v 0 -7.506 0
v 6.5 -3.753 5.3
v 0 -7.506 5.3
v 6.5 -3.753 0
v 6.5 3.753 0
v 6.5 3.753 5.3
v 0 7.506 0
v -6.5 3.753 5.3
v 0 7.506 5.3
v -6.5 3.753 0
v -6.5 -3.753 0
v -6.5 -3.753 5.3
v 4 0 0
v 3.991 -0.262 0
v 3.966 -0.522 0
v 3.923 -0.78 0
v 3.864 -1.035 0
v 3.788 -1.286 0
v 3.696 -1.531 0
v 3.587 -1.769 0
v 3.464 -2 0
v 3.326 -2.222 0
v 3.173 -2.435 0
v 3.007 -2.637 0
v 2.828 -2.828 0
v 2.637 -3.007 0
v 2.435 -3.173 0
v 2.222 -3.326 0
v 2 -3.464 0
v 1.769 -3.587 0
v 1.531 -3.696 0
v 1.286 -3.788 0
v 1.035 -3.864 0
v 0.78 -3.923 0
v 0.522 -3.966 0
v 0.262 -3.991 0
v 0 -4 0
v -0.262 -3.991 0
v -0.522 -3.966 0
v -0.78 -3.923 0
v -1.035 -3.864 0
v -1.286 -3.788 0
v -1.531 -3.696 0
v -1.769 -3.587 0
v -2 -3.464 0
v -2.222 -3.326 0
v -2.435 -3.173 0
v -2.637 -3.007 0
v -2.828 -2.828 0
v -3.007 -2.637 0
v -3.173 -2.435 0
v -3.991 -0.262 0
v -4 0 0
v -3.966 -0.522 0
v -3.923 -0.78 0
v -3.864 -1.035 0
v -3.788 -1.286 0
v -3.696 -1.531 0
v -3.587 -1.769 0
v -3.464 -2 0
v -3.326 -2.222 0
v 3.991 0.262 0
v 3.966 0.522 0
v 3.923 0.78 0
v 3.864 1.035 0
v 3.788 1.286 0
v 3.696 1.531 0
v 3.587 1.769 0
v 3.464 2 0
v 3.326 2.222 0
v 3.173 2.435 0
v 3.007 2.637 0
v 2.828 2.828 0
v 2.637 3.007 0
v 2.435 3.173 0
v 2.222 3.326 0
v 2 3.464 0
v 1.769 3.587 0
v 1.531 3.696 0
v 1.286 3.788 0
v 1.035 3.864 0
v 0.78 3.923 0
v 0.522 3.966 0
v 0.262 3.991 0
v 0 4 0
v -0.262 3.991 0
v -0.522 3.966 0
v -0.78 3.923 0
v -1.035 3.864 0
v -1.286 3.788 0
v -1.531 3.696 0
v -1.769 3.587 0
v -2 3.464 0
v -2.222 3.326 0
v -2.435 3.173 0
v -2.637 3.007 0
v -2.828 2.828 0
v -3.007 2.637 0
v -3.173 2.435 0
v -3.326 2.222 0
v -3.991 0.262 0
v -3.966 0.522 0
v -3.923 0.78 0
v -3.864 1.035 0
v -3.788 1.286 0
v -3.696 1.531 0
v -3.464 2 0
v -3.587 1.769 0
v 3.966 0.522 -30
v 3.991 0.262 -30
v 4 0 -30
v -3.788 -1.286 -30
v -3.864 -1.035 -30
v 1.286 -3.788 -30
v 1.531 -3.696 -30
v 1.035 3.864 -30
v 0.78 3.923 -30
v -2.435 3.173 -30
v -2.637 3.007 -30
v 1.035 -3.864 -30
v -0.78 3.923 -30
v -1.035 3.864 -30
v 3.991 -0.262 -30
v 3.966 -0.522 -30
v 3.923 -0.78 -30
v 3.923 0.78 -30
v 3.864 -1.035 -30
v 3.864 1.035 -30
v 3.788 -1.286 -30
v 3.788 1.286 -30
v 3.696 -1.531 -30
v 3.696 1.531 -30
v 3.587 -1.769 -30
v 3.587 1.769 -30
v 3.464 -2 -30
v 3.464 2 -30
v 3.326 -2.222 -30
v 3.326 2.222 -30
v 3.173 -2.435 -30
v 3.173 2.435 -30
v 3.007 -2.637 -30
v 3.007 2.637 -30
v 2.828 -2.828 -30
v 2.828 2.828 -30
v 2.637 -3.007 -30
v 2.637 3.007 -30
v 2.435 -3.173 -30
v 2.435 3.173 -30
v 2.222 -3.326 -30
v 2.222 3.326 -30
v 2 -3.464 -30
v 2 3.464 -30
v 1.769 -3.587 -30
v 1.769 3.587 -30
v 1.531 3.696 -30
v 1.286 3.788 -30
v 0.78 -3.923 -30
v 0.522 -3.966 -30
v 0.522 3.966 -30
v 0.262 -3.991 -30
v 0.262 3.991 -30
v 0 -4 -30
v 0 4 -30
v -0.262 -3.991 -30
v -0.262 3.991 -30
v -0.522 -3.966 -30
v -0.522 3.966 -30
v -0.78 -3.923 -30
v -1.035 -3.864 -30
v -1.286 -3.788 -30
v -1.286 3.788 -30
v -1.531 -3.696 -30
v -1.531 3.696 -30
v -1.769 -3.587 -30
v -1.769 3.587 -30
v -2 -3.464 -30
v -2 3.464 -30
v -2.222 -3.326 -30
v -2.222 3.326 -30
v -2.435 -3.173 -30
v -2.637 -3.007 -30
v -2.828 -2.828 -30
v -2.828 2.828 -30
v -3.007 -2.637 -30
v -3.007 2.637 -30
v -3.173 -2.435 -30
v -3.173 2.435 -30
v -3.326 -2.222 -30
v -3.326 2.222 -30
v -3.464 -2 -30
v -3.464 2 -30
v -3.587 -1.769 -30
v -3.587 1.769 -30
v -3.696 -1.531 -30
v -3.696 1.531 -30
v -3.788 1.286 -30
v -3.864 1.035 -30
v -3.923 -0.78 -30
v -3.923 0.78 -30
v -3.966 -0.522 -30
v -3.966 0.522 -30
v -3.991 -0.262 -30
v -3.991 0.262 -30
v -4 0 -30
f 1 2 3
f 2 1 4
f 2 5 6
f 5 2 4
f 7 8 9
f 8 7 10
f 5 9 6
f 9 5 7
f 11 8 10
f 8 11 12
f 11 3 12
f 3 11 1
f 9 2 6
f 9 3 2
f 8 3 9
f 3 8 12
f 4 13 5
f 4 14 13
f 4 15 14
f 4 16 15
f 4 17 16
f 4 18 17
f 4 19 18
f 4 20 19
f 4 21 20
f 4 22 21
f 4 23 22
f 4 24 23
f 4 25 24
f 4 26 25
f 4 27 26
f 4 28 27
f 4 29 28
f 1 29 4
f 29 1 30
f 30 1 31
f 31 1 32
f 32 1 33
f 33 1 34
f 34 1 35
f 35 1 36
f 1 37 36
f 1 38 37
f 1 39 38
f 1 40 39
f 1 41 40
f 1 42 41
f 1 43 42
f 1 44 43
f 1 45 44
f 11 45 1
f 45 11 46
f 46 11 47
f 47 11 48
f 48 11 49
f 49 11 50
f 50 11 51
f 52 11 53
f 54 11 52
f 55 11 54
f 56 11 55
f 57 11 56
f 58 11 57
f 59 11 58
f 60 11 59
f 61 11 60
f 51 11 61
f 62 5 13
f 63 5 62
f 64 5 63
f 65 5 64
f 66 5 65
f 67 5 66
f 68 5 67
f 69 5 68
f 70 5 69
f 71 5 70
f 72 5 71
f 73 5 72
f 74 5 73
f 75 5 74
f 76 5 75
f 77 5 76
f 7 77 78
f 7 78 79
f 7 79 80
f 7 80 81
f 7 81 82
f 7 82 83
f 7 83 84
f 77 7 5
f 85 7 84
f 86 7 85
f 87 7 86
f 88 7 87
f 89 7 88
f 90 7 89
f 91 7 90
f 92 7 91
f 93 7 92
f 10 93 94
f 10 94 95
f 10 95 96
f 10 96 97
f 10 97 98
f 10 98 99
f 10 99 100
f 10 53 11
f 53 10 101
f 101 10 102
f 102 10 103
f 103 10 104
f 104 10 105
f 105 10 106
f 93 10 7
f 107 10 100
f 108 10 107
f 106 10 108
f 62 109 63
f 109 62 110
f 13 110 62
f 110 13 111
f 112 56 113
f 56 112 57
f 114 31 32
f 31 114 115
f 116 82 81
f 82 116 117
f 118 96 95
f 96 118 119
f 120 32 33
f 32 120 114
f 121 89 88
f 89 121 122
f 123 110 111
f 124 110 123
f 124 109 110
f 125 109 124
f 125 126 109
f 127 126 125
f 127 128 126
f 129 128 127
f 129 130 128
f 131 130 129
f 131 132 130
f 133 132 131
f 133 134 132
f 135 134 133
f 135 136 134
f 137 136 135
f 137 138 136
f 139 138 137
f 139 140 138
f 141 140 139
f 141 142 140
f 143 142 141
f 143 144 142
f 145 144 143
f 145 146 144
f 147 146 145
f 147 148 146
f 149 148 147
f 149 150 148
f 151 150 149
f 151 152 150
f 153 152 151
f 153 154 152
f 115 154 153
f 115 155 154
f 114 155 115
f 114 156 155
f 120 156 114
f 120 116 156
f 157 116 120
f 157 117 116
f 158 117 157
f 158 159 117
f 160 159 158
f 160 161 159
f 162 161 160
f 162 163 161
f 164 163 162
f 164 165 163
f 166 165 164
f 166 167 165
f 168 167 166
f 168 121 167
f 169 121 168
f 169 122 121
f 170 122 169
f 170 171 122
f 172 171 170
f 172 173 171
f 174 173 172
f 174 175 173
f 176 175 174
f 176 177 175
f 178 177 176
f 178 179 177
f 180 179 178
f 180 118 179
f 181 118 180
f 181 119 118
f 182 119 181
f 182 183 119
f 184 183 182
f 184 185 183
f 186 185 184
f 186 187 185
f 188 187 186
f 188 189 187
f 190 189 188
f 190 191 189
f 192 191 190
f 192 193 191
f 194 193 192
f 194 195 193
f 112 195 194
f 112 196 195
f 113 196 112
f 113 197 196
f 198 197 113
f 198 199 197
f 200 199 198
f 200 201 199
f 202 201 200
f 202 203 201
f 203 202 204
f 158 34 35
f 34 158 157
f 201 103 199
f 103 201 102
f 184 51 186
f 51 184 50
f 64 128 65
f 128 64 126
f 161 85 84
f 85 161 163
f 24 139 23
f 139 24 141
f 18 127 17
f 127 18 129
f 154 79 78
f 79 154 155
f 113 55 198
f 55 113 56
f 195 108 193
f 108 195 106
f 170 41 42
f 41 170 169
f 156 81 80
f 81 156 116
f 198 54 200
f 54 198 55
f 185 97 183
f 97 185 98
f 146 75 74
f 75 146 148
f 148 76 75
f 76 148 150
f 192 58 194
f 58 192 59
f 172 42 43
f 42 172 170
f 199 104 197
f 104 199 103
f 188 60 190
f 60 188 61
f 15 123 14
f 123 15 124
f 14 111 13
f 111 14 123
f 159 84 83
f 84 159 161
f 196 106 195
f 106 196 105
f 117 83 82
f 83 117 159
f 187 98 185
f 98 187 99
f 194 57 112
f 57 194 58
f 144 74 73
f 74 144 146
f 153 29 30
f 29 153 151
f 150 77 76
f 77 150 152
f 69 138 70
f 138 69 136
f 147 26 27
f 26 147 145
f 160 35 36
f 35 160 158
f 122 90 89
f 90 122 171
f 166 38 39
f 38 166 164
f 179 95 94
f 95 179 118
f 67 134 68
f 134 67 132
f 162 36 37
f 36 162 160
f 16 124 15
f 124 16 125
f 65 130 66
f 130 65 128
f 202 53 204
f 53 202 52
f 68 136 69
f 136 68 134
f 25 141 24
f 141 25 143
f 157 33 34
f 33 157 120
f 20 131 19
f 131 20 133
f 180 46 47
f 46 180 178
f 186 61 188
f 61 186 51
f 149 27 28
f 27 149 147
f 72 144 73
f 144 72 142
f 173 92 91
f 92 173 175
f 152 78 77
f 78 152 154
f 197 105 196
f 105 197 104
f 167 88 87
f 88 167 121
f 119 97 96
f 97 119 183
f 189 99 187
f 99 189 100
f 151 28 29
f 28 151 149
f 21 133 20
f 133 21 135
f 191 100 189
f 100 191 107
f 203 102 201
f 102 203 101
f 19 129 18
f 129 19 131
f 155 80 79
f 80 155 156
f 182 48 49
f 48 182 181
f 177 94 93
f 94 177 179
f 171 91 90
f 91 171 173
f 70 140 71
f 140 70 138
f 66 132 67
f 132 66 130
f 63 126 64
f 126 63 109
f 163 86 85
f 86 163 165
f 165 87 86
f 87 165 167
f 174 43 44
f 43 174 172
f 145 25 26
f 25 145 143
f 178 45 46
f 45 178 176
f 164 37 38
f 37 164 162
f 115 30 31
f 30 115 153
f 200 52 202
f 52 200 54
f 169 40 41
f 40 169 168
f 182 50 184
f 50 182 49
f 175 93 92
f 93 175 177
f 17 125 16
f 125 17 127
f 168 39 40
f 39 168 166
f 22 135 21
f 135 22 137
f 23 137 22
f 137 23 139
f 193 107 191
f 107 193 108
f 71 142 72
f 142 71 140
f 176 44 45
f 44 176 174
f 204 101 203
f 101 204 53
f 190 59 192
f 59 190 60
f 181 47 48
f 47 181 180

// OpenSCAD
head_af = 13;
head_height = 5.3;
shank_diameter = 8;
shank_length = 30;

union() {
    // 頭部：底面 z=0、上面 z=5.3
    rotate([0, 0, 30])
        cylinder(
            h = head_height,
            r = head_af / sqrt(3),
            $fn = 6
        );

    // シャンク：z=-30 から z=0
    translate([0, 0, -shank_length])
        cylinder(
            h = shank_length,
            d = shank_diameter,
            $fn = 96
        );
}
